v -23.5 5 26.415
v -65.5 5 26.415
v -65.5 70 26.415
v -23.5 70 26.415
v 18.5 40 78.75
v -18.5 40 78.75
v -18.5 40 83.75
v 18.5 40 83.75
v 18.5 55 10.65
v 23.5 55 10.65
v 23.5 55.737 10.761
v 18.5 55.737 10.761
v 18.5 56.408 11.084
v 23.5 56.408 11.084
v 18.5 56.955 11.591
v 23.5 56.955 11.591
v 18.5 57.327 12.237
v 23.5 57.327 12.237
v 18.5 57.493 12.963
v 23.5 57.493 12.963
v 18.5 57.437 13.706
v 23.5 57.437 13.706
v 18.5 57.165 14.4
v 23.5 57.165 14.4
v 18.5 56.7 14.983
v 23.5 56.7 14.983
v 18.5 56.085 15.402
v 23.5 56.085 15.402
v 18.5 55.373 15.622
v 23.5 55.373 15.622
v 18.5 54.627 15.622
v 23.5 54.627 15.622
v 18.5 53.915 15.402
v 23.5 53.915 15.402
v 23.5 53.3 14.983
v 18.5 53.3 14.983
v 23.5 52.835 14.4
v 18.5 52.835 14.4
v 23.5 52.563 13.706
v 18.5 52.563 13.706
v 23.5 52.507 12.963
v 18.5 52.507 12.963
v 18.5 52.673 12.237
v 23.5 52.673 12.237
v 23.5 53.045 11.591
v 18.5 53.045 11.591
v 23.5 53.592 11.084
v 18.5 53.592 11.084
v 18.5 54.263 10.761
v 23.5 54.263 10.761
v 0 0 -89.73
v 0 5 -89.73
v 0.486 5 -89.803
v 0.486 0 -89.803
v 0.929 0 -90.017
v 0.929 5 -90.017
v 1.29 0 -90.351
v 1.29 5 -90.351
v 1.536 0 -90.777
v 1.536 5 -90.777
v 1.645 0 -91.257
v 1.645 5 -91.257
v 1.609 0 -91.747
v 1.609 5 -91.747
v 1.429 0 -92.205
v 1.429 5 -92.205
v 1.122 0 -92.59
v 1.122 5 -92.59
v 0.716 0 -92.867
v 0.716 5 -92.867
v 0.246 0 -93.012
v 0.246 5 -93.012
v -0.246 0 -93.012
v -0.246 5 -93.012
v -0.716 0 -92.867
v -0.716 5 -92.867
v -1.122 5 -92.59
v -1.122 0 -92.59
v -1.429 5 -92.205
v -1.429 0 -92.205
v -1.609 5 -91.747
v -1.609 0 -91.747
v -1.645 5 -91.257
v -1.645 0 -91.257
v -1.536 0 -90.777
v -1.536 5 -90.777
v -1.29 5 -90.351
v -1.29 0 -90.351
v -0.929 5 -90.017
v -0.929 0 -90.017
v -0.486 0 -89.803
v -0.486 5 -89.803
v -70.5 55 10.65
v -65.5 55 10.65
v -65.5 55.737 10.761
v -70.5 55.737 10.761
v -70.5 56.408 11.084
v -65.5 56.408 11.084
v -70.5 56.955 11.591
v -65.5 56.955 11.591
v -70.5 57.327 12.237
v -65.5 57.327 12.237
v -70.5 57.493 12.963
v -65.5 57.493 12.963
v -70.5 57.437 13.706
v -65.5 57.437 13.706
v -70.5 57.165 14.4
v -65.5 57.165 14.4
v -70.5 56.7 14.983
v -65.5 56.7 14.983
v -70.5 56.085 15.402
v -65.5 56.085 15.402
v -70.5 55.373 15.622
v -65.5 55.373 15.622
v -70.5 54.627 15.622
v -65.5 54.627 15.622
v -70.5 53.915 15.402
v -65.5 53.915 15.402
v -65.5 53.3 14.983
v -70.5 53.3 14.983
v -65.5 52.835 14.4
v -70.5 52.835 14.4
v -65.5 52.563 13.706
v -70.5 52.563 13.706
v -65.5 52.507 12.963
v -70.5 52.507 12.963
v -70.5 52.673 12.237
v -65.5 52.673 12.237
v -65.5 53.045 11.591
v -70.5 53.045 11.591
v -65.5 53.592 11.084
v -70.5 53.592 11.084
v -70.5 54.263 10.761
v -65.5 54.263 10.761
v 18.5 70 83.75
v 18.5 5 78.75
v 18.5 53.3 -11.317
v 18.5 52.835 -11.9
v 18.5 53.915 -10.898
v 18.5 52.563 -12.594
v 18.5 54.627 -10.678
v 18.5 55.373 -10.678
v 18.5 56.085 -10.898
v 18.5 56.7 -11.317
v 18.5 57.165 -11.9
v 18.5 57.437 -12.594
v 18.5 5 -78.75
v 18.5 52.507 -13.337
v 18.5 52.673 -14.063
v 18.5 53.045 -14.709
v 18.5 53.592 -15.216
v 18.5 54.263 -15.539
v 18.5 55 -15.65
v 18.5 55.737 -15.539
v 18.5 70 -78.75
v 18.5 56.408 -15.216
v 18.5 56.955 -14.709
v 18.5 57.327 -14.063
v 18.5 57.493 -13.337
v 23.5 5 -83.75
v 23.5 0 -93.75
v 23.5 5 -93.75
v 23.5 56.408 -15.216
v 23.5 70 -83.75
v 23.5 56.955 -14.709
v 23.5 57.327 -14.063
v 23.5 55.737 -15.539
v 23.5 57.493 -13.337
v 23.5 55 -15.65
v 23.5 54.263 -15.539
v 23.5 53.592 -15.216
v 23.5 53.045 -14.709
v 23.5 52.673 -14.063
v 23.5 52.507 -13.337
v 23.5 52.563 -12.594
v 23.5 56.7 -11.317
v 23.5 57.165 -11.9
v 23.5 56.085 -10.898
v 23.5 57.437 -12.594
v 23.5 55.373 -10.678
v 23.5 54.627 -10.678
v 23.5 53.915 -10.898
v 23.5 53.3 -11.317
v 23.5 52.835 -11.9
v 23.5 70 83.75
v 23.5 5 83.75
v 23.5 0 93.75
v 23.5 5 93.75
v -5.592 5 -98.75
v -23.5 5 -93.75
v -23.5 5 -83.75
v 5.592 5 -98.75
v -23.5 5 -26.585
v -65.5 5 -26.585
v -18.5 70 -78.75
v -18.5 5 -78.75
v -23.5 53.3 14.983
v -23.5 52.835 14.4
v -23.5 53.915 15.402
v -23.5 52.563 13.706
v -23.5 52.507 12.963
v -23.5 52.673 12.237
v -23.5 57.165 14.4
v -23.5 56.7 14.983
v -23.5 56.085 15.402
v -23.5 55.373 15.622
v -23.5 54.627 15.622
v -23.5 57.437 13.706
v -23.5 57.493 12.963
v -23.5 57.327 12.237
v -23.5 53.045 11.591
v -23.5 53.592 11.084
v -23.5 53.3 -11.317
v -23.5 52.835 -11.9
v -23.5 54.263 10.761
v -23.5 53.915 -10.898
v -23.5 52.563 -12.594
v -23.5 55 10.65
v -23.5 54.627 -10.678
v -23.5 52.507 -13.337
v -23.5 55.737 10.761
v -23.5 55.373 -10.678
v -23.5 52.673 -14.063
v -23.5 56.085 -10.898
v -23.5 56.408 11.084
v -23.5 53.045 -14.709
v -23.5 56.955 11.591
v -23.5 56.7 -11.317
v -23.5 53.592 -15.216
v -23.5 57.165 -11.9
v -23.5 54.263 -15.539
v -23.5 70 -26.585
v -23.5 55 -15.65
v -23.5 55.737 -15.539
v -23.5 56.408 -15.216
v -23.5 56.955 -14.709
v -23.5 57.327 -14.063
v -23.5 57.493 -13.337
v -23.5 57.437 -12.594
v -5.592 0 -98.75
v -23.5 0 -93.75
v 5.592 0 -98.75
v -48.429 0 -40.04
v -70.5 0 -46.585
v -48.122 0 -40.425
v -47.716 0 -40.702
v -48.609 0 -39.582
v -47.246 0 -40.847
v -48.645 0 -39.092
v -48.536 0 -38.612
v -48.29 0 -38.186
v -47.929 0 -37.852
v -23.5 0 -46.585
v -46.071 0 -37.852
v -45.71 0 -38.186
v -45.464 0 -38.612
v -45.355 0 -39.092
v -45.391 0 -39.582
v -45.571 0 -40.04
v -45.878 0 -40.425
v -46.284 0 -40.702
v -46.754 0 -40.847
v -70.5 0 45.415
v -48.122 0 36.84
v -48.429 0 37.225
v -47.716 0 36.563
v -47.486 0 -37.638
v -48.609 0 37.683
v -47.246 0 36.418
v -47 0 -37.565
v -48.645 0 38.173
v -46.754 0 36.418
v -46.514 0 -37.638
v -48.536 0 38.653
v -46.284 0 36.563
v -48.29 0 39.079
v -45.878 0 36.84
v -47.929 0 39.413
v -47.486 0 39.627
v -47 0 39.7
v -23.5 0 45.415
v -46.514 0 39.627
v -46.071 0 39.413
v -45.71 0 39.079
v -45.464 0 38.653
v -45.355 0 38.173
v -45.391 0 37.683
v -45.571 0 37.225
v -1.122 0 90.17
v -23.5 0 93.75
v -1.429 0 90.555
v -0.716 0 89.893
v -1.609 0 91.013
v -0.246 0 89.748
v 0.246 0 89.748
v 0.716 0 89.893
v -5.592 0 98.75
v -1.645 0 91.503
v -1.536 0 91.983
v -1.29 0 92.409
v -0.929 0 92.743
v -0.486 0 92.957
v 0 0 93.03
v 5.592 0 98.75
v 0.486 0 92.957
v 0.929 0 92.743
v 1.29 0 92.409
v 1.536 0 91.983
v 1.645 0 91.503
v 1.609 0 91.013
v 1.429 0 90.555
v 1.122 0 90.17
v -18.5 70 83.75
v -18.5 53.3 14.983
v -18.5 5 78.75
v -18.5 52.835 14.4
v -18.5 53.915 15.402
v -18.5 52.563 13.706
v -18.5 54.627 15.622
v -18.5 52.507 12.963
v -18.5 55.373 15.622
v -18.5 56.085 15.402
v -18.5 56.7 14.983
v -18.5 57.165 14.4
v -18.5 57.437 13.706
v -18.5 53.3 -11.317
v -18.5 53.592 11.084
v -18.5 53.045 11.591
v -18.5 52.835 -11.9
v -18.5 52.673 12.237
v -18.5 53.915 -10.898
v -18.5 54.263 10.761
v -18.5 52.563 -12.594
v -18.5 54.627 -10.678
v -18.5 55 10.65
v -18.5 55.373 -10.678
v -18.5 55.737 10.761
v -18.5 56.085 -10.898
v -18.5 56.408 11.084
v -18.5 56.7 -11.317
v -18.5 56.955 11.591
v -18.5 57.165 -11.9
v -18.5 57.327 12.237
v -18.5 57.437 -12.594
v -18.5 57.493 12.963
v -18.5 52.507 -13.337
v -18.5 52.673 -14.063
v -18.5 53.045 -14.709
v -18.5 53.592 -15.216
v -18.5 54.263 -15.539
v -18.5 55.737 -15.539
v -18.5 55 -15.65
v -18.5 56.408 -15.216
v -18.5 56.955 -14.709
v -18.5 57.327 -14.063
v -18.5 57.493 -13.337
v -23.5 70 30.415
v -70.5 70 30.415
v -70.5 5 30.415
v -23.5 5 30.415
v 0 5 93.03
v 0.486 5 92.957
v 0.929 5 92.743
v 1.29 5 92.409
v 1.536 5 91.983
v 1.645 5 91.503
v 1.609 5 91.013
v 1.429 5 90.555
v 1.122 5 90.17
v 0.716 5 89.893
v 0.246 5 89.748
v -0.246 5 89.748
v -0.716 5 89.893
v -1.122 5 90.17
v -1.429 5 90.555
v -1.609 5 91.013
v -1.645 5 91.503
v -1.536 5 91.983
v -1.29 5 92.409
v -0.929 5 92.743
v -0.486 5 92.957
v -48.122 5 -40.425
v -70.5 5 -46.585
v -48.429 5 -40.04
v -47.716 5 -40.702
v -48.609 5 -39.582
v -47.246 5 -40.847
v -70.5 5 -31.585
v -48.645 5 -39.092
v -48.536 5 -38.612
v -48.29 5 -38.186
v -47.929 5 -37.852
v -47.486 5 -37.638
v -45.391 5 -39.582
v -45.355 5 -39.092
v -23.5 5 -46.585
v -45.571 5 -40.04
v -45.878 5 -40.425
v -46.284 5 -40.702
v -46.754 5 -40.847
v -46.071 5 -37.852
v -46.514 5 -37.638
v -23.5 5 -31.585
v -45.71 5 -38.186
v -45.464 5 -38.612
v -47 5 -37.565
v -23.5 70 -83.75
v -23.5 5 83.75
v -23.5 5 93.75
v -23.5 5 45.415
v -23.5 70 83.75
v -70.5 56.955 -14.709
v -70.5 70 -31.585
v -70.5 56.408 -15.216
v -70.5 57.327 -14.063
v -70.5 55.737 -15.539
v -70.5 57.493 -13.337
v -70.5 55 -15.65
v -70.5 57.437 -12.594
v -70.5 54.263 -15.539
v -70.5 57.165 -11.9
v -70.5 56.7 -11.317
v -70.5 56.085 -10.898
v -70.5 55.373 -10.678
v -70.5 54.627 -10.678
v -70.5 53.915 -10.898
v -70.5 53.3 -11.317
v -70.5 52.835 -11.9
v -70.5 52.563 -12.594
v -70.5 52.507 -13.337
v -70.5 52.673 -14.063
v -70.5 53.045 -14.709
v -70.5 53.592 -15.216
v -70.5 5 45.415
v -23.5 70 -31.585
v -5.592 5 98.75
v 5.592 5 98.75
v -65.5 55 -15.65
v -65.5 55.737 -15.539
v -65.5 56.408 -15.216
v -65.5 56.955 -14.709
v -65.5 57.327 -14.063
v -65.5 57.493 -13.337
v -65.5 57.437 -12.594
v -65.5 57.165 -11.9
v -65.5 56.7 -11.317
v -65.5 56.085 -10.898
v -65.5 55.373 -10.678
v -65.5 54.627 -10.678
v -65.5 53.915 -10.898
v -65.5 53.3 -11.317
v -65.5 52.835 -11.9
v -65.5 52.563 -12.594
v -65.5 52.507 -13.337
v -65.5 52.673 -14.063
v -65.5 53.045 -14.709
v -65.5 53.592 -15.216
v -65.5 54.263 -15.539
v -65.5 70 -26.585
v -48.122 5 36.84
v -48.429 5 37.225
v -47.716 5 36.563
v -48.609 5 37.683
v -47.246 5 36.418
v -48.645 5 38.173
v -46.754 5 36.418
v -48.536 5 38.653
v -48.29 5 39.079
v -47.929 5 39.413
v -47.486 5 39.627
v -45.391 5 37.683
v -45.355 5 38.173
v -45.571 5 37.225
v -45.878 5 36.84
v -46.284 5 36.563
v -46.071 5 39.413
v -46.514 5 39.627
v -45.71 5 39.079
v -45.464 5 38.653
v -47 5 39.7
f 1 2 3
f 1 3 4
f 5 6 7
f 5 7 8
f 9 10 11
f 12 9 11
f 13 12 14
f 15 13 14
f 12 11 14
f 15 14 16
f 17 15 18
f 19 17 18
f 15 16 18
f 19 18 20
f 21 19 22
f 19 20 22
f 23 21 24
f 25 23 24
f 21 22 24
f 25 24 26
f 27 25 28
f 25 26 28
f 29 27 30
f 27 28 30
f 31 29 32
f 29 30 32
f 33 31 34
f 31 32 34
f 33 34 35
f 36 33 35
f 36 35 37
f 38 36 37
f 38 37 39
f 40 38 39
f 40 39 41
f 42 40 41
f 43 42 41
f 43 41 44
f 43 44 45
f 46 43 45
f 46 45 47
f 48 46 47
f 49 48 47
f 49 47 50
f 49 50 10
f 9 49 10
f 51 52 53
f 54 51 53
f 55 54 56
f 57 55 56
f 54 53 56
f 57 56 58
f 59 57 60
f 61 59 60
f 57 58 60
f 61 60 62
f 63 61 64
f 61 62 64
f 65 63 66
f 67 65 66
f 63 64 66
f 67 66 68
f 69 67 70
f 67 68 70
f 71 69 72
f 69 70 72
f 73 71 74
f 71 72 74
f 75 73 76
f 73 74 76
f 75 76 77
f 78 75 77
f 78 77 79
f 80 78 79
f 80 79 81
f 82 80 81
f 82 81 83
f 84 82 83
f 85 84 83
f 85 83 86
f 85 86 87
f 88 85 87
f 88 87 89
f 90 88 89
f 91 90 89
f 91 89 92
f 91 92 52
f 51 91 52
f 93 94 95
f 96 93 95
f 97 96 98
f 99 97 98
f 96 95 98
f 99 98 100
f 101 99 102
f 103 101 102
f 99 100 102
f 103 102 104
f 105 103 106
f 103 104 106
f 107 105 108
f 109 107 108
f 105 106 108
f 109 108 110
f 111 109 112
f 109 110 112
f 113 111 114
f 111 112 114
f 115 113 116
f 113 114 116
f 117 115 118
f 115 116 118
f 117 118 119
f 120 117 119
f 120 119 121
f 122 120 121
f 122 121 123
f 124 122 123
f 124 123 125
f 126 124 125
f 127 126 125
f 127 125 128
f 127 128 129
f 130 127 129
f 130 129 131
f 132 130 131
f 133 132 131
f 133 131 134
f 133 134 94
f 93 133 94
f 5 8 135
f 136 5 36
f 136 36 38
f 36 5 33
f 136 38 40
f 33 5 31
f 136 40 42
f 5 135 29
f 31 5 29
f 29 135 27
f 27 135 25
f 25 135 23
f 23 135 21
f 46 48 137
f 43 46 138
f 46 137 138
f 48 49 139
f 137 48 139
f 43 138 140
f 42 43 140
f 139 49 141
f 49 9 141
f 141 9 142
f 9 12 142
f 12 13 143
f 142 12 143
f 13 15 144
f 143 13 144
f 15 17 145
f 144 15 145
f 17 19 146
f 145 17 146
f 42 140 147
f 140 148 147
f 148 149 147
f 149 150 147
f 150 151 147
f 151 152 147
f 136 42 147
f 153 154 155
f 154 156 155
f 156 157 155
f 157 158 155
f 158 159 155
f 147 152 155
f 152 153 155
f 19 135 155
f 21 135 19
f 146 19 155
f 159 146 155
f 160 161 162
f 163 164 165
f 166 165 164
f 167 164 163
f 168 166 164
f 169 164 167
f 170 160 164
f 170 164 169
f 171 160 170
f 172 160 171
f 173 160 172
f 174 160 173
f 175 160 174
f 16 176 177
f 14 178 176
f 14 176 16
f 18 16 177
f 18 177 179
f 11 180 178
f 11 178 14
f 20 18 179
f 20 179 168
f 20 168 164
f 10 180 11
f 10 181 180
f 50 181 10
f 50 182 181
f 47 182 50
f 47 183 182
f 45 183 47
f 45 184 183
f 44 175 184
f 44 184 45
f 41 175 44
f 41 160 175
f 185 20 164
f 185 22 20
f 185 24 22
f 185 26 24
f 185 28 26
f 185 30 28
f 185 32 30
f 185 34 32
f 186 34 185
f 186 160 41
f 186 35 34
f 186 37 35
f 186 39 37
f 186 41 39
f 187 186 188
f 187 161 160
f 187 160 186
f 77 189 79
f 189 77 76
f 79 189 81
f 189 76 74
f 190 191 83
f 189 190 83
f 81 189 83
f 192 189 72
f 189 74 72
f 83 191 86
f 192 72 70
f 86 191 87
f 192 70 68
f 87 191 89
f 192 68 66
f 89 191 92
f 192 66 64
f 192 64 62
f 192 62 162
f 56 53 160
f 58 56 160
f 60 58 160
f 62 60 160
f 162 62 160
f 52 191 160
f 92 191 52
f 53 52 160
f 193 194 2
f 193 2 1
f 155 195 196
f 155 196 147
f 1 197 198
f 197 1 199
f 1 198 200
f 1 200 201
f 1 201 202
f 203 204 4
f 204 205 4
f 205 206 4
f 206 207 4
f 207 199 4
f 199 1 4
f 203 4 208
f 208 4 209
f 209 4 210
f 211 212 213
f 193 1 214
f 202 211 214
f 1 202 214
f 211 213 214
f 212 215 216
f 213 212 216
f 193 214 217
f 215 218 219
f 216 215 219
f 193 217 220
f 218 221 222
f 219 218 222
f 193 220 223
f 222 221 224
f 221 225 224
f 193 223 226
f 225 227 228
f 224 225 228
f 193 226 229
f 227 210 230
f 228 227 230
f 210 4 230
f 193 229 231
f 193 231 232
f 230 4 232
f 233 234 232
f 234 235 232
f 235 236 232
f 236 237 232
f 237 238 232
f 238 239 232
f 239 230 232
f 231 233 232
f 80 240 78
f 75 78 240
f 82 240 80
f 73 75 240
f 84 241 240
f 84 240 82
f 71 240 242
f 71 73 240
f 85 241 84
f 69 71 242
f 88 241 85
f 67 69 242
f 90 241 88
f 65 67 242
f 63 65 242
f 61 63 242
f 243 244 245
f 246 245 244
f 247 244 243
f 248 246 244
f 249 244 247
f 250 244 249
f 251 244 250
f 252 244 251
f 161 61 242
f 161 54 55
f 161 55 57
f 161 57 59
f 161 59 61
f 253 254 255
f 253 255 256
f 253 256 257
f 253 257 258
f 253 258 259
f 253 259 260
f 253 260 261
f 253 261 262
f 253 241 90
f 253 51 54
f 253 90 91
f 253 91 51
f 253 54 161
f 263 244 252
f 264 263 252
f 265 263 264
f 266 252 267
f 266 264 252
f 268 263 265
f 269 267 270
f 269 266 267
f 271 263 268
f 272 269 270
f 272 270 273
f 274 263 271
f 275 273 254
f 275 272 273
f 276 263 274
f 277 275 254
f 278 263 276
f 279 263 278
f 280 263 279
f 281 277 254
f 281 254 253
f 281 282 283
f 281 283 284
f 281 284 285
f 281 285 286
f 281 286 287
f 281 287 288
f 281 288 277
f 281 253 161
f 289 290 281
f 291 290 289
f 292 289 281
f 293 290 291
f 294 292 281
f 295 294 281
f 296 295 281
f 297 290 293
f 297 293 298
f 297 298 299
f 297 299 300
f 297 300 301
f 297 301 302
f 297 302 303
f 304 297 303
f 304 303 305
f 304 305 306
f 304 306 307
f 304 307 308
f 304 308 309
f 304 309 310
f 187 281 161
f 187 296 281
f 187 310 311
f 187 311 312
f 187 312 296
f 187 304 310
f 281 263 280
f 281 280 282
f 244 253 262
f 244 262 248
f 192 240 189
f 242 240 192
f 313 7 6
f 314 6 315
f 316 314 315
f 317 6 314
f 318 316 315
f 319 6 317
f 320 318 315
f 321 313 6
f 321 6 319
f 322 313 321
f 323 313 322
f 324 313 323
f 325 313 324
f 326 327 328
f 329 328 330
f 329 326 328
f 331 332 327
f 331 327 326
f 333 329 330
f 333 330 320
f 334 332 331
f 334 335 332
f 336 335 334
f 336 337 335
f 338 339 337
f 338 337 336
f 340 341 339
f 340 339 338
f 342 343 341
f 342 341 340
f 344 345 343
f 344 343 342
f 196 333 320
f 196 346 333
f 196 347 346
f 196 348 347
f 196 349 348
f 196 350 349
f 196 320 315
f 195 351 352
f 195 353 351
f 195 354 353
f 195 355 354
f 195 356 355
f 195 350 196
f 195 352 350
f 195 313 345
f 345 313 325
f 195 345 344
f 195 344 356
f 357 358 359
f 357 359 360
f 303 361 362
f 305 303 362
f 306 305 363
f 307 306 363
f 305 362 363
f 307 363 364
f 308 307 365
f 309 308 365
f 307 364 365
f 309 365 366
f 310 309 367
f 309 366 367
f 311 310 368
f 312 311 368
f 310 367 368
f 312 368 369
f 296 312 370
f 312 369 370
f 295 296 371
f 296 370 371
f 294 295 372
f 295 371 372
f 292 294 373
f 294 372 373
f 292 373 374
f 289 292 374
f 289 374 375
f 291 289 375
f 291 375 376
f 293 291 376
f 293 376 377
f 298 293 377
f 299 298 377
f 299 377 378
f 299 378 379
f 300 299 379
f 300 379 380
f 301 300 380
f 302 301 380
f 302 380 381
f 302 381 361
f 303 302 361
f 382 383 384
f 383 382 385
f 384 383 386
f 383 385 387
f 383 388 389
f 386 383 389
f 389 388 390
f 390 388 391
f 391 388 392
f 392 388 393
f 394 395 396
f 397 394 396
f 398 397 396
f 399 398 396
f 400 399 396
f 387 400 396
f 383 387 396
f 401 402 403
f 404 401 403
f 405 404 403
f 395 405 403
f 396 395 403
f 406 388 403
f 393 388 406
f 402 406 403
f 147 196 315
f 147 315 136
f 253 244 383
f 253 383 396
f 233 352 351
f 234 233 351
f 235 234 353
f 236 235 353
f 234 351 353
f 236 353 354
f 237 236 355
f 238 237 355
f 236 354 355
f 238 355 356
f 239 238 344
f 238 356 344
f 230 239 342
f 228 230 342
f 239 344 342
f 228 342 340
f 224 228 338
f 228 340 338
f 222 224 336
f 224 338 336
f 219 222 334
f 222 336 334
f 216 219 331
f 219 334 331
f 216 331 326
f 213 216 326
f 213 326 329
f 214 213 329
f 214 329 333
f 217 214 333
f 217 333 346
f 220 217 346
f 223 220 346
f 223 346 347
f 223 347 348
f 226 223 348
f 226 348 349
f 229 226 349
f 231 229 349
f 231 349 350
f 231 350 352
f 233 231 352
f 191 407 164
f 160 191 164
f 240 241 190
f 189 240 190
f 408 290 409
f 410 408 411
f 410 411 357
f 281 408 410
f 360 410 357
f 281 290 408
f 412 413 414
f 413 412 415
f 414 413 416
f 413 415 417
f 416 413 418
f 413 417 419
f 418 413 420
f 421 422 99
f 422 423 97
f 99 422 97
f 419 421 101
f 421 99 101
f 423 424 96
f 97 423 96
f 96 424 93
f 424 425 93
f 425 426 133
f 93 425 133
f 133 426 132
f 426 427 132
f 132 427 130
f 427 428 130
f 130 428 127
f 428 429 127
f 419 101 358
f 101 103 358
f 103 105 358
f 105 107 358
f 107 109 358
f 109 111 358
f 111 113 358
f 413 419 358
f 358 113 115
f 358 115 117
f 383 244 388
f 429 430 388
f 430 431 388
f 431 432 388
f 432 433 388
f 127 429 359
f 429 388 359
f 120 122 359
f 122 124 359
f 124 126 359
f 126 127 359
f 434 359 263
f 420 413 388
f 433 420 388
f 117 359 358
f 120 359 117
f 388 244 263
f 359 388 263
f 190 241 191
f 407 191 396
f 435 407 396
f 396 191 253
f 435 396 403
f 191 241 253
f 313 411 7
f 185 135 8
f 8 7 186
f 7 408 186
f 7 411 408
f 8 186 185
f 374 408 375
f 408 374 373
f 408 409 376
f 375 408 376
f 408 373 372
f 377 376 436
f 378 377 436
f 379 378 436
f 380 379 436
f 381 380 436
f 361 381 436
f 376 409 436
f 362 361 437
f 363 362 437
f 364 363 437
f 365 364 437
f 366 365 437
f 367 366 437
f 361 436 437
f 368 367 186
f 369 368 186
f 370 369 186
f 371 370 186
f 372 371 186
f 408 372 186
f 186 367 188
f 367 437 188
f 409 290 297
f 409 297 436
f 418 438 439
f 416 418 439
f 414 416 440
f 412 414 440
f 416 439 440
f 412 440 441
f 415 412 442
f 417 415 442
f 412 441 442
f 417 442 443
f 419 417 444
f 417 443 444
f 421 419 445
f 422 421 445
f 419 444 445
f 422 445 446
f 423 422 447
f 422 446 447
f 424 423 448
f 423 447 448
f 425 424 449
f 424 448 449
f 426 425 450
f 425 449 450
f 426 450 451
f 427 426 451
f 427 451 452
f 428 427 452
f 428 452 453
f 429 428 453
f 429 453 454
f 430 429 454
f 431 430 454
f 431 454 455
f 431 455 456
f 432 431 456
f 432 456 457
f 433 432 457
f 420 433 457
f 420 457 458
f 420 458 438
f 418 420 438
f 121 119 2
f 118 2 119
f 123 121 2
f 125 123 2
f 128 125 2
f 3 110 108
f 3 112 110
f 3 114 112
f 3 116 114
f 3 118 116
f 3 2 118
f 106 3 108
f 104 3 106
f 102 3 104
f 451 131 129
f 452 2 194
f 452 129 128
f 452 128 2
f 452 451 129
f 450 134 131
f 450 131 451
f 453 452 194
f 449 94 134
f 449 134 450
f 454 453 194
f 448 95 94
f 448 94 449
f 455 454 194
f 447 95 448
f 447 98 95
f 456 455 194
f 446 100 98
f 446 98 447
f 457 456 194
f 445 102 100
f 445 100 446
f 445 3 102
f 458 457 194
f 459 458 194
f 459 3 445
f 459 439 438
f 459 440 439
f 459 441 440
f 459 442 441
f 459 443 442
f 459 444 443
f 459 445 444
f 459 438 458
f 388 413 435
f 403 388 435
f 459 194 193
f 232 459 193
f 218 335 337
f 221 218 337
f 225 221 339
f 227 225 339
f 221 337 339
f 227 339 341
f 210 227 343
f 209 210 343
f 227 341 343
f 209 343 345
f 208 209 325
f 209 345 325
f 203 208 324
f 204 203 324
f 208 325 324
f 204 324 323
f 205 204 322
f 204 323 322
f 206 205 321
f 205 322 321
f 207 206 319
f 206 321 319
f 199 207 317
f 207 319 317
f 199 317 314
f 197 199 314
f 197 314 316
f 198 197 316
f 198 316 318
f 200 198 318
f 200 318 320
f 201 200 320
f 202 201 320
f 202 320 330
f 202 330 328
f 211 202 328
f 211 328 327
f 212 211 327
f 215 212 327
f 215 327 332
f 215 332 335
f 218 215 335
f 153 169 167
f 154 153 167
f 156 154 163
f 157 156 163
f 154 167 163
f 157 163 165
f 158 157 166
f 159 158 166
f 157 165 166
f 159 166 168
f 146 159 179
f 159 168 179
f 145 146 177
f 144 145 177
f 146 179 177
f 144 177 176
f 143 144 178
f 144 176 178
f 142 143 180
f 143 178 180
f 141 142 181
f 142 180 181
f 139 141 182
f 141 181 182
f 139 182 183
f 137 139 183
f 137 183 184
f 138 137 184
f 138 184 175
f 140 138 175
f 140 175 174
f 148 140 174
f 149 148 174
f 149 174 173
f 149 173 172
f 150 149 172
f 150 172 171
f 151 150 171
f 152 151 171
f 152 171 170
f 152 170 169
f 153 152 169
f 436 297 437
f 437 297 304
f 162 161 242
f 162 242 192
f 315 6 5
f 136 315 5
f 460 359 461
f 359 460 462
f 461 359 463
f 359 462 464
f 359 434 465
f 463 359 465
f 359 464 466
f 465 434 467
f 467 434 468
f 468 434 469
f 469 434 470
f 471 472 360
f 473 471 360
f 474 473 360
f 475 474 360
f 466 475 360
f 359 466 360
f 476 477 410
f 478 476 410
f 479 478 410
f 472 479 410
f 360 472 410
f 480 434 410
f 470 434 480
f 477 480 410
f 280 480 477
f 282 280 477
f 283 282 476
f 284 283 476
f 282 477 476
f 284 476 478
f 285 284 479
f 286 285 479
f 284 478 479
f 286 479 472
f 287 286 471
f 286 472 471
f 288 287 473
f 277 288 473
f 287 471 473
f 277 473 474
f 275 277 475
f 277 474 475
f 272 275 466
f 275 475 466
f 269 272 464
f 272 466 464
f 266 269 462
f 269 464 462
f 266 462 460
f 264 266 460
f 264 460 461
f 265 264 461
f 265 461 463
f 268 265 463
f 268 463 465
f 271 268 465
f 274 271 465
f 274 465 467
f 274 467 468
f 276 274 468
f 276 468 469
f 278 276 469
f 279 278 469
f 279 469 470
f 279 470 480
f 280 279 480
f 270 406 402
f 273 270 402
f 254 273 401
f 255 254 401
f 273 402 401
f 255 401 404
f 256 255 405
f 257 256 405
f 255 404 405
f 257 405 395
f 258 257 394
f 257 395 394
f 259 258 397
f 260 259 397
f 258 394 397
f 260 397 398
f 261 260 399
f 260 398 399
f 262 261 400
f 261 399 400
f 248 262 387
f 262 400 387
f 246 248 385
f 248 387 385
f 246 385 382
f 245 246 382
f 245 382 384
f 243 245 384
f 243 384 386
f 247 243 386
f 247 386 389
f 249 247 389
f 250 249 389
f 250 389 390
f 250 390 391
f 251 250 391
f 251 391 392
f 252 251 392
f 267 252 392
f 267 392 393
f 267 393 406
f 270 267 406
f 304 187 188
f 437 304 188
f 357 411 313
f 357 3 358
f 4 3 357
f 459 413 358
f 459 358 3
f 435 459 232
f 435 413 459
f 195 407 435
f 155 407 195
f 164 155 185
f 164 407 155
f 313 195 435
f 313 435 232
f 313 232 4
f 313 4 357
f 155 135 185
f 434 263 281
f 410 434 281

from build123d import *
from OCP.BRepFilletAPI import BRepFilletAPI_MakeChamfer

# Parameters (mm, degrees)
ESBO_O1_W                = 47
ESBO_O1_H                = 62
ESBO_O1_H_2              = 167.5
RESSALTO_EXTRUS_O1_DEPTH = 70
ESBO_O3_W                = 37
ESBO_O3_H                = 157.5
CORTE_EXTRUS_O2_DEPTH    = 65
ESBO_O5_W                = 37
ESBO_O5_H                = 31.934482306
CORTE_EXTRUS_O3_DEPTH    = 30
ESBO_O11_W               = 47
ESBO_O11_H               = 15
RESSALTO_EXTRUS_O2_DEPTH = 5
ESBO_O12_R               = 1.65
CORTE_EXTRUS_O6_DEPTH    = 138.647420971
ESBO_O14_R               = 2.5
CORTE_EXTRUS_O8_DEPTH    = 154.256525147
ESBO_O15_W               = 42
ESBO_O15_H               = 53
CORTE_EXTRUS_O10_DEPTH   = 65
CHANFRO9_SIZE            = 5
CHANFRO9_SIZE2           = 17.907987678


with BuildPart() as part:
    # Esboço1 → Ressalto-extrusão1 (new body)
    with BuildSketch(Plane(origin=(0, 0, 0), x_dir=(1, 0, 0), z_dir=(0, 1, 0))):
        with Locations((-47, 0.585067636)):
            Rectangle(ESBO_O1_W, ESBO_O1_H)
        Rectangle(ESBO_O1_W, ESBO_O1_H_2)
    extrude(amount=RESSALTO_EXTRUS_O1_DEPTH)

    # Esboço3 → Corte-extrusão2 (cut)
    with BuildSketch(Plane(origin=(0, 70, 0), x_dir=(1, 0, 0), z_dir=(0, 1, 0))):
        Rectangle(ESBO_O3_W, ESBO_O3_H)
    extrude(amount=-CORTE_EXTRUS_O2_DEPTH, mode=Mode.SUBTRACT)

    # Esboço5 → Corte-extrusão3 (cut)
    with BuildSketch(Plane(origin=(0, 70, 0), x_dir=(1, 0, 0), z_dir=(0, 1, 0))):
        with Locations((0, -78.75)):
            Rectangle(ESBO_O5_W, ESBO_O5_H)
    extrude(amount=-CORTE_EXTRUS_O3_DEPTH, mode=Mode.SUBTRACT)

    # Esboço11 → Ressalto-extrusão2 (add)
    with BuildSketch(Plane.XZ):
        with Locations((0, -91.25)):
            Rectangle(ESBO_O11_W, ESBO_O11_H)
        with Locations((0, 91.25)):
            Rectangle(ESBO_O11_W, ESBO_O11_H)
        with Locations((-47, -39.085067636)):
            Rectangle(ESBO_O11_W, ESBO_O11_H)
        with Locations((-47, 37.914932364)):
            Rectangle(ESBO_O11_W, ESBO_O11_H)
    extrude(amount=-RESSALTO_EXTRUS_O2_DEPTH)

    # Esboço12 → Corte-extrusão6 (cut, through all)
    with BuildSketch(Plane(origin=(0, 5, 0), x_dir=(1, 0, 0), z_dir=(0, 1, 0))):
        with Locations(Location((-47, -38.049932364, 0), (0, 0, 270))):
            Circle(ESBO_O12_R)
        with Locations(Location((-47, 39.215067636, 0), (0, 0, 270))):
            Circle(ESBO_O12_R)
        with Locations(Location((0, -91.38, 0), (0, 0, 270))):
            Circle(ESBO_O12_R)
        with Locations(Location((0, 91.38, 0), (0, 0, 270))):
            Circle(ESBO_O12_R)
    extrude(amount=-CORTE_EXTRUS_O6_DEPTH, mode=Mode.SUBTRACT)

    # Esboço14 → Corte-extrusão8 (cut, through all)
    with BuildSketch(Plane(origin=(23.5, 0, 0), x_dir=(0, 0, -1), z_dir=(1, 0, 0))):
        with Locations((-13.15, 55)):
            Circle(ESBO_O14_R)
        with Locations((13.15, 55)):
            Circle(ESBO_O14_R)
    extrude(amount=-CORTE_EXTRUS_O8_DEPTH, mode=Mode.SUBTRACT)

    # Esboço15 → Corte-extrusão10 (cut)
    with BuildSketch(Plane(origin=(0, 70, 0), x_dir=(1, 0, 0), z_dir=(0, 1, 0))):
        with Locations((-44.5, 0.085067636)):
            Rectangle(ESBO_O15_W, ESBO_O15_H)
    extrude(amount=-CORTE_EXTRUS_O10_DEPTH, mode=Mode.SUBTRACT)

    # Chanfro9: one chamfer whose edges measure the first distance from different faces: ONE call of the kernel's chamfer builder (chamfer() names one face for all edges)
    chanfro9_edges_1 = [part.edges().sort_by_distance(p)[0] for p in [
        (-23.5, 2.5, -98.75),
    ]]
    chanfro9_side_1 = [part.faces().sort_by_distance(p)[0] for p in [
        (-23.5, 35, -58.73896239),
    ]]
    chanfro9_edges_2 = [part.edges().sort_by_distance(p)[0] for p in [
        (23.5, 2.5, -98.75),
        (23.5, 2.5, 98.75),
    ]]
    chanfro9_side_2 = [part.faces().sort_by_distance(p)[0] for p in [
        (23.5, 34.521753359, 0),
    ]]
    chanfro9_edges_3 = [part.edges().sort_by_distance(p)[0] for p in [
        (-23.5, 2.5, 98.75),
    ]]
    chanfro9_side_3 = [part.faces().sort_by_distance(p)[0] for p in [
        (-23.5, 35, 58.153894753),
    ]]
    chanfro9 = BRepFilletAPI_MakeChamfer(part.part.solid().wrapped)
    for e in chanfro9_edges_1:
        chanfro9.Add(CHANFRO9_SIZE, CHANFRO9_SIZE2, e.wrapped, chanfro9_side_1[0].wrapped)  # the first distance lies on this face
    for e in chanfro9_edges_2:
        chanfro9.Add(CHANFRO9_SIZE, CHANFRO9_SIZE2, e.wrapped, chanfro9_side_2[0].wrapped)  # the first distance lies on this face
    for e in chanfro9_edges_3:
        chanfro9.Add(CHANFRO9_SIZE, CHANFRO9_SIZE2, e.wrapped, chanfro9_side_3[0].wrapped)  # the first distance lies on this face
    add(Compound.cast(chanfro9.Shape()), mode=Mode.REPLACE)


solid = part.part
